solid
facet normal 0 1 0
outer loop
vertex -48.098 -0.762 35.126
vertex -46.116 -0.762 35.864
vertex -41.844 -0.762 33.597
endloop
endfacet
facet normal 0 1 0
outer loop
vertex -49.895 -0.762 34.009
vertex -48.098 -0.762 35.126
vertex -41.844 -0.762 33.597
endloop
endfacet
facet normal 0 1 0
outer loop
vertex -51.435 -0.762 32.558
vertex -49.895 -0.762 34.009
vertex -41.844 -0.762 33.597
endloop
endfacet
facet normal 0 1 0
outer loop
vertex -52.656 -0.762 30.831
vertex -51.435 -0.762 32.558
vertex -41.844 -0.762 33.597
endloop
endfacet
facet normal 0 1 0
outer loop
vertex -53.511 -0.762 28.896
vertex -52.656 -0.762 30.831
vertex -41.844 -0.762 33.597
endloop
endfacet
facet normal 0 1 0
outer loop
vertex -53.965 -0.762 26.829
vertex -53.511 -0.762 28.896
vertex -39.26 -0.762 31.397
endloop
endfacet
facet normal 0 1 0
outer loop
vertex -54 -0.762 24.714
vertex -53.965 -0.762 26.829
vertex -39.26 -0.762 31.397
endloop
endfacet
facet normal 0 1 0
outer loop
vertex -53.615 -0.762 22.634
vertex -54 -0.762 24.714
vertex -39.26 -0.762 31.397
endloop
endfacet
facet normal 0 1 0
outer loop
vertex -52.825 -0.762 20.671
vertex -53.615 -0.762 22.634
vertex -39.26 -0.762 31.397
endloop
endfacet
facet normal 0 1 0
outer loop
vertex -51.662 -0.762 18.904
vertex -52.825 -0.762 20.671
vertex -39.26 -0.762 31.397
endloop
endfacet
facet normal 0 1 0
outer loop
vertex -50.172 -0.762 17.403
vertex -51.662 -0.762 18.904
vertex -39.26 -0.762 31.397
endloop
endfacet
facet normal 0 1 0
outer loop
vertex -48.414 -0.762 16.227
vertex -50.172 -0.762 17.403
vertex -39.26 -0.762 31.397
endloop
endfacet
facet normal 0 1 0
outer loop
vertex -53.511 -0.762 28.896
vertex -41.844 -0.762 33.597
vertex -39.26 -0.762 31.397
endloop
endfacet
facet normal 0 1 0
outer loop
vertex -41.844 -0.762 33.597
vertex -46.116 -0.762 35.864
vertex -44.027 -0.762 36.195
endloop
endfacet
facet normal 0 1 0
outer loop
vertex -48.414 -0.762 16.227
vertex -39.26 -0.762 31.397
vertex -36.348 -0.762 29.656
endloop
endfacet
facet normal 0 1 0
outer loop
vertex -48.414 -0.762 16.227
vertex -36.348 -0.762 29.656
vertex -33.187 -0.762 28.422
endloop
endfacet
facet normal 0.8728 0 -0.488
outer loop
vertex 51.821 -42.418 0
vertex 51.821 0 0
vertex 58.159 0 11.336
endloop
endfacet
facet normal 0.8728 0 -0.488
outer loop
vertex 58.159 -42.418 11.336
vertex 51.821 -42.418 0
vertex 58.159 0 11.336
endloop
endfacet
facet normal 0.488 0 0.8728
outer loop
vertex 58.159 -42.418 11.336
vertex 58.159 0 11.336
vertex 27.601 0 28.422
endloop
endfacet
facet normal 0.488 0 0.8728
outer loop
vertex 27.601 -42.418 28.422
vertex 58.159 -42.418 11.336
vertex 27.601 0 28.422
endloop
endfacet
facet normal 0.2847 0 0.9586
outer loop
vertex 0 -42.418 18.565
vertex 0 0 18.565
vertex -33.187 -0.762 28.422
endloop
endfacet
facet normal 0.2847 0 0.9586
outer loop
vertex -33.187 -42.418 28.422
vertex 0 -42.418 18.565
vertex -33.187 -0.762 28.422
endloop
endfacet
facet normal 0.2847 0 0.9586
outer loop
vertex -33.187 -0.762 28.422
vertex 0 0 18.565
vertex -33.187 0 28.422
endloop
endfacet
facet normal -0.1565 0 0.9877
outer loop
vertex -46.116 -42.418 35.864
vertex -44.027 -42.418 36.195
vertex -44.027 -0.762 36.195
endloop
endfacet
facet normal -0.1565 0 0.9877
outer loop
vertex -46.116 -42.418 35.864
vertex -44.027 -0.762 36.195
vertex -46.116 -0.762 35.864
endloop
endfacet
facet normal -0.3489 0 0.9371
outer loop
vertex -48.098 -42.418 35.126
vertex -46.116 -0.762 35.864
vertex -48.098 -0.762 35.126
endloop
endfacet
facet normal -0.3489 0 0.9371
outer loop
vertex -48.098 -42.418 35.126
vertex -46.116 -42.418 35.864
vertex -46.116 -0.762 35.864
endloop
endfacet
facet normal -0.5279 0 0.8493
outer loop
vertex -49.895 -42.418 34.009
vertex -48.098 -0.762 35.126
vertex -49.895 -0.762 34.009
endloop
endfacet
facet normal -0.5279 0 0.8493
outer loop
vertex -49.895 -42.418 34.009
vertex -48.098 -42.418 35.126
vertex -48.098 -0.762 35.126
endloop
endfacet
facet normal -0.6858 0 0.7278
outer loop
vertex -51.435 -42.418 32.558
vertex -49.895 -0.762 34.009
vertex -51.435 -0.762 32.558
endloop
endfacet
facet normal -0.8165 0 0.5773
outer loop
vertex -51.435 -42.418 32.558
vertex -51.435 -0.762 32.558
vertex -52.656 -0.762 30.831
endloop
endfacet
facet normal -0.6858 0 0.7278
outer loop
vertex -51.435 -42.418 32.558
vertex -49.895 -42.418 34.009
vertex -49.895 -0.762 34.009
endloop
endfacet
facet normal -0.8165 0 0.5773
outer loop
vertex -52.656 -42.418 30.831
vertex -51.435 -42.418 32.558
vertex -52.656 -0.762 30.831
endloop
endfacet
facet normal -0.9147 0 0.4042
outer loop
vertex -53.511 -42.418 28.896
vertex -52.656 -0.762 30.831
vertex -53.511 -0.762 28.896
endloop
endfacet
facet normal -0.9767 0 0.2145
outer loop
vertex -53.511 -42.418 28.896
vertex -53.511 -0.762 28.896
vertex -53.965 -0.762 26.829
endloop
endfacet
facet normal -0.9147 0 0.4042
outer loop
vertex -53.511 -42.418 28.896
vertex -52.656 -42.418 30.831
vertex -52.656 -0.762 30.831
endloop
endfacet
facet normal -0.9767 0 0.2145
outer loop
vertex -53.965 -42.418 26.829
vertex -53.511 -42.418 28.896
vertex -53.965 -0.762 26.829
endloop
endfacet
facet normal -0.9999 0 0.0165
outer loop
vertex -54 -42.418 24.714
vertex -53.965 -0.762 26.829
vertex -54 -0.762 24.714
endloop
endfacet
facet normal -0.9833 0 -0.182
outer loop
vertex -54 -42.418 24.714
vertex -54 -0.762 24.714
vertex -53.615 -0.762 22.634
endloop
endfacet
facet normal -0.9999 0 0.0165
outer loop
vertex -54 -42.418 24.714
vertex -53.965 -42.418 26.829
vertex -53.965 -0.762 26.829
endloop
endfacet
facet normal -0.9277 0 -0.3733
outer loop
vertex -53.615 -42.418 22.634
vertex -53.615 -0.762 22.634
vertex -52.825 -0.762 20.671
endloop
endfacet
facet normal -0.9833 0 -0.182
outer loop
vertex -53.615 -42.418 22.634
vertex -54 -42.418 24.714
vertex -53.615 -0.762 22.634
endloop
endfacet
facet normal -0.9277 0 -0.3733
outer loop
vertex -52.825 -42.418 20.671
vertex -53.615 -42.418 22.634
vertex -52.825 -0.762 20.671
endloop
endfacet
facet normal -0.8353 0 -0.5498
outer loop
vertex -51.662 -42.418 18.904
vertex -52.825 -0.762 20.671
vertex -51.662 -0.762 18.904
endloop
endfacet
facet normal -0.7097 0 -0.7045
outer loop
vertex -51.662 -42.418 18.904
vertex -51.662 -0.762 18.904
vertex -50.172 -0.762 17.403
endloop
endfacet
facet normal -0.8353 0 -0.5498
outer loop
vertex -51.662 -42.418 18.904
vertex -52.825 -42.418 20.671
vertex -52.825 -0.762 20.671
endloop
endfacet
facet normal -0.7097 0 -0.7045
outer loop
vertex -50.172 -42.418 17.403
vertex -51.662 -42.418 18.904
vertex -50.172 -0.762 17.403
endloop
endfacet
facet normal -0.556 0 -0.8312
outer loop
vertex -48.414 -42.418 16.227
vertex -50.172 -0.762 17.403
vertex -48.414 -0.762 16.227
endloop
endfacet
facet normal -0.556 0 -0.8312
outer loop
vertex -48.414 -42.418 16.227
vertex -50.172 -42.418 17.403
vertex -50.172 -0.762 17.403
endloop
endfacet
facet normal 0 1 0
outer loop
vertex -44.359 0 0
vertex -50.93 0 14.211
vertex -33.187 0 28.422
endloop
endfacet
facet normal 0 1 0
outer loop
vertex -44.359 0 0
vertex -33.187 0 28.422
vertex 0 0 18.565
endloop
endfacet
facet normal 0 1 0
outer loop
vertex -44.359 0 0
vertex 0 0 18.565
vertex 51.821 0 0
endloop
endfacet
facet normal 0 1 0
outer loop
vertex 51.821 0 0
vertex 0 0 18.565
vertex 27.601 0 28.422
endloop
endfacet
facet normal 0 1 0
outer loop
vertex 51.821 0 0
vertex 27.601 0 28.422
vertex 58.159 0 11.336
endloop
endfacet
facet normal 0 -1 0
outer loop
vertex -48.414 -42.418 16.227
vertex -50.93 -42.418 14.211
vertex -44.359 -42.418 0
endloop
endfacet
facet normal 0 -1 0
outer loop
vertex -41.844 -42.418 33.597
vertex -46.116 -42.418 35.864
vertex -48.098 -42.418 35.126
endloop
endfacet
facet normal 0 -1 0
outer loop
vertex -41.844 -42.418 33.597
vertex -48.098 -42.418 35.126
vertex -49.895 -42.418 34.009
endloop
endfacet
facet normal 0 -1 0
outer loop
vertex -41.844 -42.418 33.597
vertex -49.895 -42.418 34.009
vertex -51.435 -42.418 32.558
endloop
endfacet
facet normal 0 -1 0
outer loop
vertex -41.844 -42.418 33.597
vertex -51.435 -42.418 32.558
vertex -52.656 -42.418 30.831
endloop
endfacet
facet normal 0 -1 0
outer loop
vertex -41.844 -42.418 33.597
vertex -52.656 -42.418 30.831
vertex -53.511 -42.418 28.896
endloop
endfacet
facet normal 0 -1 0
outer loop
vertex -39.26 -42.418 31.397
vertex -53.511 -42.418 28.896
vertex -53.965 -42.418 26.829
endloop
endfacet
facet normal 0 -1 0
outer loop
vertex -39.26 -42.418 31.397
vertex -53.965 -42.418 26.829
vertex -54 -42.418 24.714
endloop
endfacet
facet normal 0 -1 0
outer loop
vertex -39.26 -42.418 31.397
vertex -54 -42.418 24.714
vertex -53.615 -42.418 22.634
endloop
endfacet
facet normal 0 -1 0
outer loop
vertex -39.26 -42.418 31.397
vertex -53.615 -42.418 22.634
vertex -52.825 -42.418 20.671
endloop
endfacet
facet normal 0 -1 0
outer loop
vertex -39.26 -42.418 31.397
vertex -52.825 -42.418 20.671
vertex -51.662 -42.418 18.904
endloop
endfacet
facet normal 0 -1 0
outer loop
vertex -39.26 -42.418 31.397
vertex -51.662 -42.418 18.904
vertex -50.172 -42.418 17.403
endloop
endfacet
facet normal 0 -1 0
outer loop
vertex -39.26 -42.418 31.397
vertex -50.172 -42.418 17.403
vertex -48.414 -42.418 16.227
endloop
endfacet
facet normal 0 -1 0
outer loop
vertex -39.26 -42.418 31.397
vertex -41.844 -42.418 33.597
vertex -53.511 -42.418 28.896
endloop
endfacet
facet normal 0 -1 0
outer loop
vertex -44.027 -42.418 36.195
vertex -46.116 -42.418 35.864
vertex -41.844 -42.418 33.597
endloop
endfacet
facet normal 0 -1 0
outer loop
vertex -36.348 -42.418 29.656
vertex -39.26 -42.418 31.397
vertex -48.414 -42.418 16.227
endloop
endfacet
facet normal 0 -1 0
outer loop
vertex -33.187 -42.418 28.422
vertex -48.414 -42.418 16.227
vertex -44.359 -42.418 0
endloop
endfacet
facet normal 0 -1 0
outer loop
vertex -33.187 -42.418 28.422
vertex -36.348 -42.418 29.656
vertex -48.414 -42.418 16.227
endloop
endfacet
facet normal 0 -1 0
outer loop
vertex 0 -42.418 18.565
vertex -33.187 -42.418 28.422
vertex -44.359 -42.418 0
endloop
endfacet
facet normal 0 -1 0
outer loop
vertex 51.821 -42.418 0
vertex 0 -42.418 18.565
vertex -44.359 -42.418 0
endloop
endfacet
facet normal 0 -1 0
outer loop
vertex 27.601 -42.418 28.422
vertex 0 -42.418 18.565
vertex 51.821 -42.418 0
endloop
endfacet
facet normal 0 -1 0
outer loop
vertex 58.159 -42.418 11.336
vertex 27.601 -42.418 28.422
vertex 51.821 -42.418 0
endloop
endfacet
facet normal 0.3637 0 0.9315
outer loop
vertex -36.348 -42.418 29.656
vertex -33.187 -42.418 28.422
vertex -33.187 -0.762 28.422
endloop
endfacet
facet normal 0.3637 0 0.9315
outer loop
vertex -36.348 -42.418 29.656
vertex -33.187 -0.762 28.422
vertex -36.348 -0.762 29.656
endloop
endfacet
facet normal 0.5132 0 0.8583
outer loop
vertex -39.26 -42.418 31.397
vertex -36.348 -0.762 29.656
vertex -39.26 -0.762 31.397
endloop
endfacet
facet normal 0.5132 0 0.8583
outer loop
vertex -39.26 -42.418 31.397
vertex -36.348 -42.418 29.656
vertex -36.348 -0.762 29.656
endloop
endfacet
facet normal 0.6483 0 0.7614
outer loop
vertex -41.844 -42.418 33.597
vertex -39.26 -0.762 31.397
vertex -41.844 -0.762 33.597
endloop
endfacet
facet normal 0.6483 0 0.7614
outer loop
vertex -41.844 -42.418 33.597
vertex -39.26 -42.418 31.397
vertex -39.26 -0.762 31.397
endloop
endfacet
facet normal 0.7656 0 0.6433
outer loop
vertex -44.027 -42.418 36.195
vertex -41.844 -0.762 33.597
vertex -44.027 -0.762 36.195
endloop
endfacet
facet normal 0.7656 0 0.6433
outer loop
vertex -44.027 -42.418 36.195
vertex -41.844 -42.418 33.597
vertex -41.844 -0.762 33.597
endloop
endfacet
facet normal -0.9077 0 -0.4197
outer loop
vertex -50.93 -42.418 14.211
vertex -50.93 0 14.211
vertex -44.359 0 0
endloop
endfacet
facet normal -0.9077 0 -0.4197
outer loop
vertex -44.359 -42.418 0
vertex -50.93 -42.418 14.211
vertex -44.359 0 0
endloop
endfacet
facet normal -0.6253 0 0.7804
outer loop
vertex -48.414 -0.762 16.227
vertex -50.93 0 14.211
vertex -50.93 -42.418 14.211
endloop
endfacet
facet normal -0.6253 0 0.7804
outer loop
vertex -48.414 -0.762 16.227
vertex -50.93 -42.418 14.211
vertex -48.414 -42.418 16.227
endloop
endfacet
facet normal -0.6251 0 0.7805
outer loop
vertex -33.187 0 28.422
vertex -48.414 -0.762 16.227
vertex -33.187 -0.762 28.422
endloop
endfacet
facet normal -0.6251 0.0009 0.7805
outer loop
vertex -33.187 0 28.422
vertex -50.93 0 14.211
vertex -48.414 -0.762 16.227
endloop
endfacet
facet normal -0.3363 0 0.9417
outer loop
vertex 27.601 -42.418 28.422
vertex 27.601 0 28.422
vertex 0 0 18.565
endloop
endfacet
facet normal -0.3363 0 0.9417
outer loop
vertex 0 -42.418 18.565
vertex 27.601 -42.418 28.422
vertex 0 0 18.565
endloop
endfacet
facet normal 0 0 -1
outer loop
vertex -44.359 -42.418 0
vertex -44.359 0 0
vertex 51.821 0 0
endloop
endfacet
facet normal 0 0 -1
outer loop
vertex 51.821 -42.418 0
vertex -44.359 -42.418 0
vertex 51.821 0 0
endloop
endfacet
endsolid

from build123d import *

# Parameters (mm, degrees)
F1_DEPTH = 42.418
F3_DEPTH = 42.672
F4_DEPTH = 1.016


with BuildPart() as f1:
    # F0 (on Front) → F1 (new body)
    with BuildSketch(Plane.XZ):
        Polygon((0, 18.5649488121), (-33.1869013608, 28.4224450588), (-50.9303919971, 14.2112225294), (-44.3587265909, 0), (51.8207407387, 0), (58.1592172384, 11.3361189142), (27.600986883, 28.4224450588), align=None)
    extrude(amount=F1_DEPTH)

    # F2 (on face) → F3 (join)
    with BuildSketch(Plane.XZ.offset(42.418)):
        with BuildLine():
            ThreePointArc((-33.1869013608, 28.4224450588), (-39.2604604224, 31.3968249678), (-44.0265255123, 36.194707738))
            ThreePointArc((-44.0265255123, 36.194707738), (-53.7891889284, 27.8738262503), (-48.4137057273, 16.2269019326))
            Line((-48.4137057273, 16.2269019326), (-33.1869013608, 28.4224450588))
        make_face()
    extrude(amount=-F3_DEPTH)

    # F4 (cut): a face of the model
    f4_faces = [f1.faces().sort_by_distance(p)[0] for p in [
        (-45.7791341784, 0.254, 26.7092590305),
    ]]
    extrude(f4_faces, amount=-F4_DEPTH, mode=Mode.SUBTRACT)


solid = f1.part
